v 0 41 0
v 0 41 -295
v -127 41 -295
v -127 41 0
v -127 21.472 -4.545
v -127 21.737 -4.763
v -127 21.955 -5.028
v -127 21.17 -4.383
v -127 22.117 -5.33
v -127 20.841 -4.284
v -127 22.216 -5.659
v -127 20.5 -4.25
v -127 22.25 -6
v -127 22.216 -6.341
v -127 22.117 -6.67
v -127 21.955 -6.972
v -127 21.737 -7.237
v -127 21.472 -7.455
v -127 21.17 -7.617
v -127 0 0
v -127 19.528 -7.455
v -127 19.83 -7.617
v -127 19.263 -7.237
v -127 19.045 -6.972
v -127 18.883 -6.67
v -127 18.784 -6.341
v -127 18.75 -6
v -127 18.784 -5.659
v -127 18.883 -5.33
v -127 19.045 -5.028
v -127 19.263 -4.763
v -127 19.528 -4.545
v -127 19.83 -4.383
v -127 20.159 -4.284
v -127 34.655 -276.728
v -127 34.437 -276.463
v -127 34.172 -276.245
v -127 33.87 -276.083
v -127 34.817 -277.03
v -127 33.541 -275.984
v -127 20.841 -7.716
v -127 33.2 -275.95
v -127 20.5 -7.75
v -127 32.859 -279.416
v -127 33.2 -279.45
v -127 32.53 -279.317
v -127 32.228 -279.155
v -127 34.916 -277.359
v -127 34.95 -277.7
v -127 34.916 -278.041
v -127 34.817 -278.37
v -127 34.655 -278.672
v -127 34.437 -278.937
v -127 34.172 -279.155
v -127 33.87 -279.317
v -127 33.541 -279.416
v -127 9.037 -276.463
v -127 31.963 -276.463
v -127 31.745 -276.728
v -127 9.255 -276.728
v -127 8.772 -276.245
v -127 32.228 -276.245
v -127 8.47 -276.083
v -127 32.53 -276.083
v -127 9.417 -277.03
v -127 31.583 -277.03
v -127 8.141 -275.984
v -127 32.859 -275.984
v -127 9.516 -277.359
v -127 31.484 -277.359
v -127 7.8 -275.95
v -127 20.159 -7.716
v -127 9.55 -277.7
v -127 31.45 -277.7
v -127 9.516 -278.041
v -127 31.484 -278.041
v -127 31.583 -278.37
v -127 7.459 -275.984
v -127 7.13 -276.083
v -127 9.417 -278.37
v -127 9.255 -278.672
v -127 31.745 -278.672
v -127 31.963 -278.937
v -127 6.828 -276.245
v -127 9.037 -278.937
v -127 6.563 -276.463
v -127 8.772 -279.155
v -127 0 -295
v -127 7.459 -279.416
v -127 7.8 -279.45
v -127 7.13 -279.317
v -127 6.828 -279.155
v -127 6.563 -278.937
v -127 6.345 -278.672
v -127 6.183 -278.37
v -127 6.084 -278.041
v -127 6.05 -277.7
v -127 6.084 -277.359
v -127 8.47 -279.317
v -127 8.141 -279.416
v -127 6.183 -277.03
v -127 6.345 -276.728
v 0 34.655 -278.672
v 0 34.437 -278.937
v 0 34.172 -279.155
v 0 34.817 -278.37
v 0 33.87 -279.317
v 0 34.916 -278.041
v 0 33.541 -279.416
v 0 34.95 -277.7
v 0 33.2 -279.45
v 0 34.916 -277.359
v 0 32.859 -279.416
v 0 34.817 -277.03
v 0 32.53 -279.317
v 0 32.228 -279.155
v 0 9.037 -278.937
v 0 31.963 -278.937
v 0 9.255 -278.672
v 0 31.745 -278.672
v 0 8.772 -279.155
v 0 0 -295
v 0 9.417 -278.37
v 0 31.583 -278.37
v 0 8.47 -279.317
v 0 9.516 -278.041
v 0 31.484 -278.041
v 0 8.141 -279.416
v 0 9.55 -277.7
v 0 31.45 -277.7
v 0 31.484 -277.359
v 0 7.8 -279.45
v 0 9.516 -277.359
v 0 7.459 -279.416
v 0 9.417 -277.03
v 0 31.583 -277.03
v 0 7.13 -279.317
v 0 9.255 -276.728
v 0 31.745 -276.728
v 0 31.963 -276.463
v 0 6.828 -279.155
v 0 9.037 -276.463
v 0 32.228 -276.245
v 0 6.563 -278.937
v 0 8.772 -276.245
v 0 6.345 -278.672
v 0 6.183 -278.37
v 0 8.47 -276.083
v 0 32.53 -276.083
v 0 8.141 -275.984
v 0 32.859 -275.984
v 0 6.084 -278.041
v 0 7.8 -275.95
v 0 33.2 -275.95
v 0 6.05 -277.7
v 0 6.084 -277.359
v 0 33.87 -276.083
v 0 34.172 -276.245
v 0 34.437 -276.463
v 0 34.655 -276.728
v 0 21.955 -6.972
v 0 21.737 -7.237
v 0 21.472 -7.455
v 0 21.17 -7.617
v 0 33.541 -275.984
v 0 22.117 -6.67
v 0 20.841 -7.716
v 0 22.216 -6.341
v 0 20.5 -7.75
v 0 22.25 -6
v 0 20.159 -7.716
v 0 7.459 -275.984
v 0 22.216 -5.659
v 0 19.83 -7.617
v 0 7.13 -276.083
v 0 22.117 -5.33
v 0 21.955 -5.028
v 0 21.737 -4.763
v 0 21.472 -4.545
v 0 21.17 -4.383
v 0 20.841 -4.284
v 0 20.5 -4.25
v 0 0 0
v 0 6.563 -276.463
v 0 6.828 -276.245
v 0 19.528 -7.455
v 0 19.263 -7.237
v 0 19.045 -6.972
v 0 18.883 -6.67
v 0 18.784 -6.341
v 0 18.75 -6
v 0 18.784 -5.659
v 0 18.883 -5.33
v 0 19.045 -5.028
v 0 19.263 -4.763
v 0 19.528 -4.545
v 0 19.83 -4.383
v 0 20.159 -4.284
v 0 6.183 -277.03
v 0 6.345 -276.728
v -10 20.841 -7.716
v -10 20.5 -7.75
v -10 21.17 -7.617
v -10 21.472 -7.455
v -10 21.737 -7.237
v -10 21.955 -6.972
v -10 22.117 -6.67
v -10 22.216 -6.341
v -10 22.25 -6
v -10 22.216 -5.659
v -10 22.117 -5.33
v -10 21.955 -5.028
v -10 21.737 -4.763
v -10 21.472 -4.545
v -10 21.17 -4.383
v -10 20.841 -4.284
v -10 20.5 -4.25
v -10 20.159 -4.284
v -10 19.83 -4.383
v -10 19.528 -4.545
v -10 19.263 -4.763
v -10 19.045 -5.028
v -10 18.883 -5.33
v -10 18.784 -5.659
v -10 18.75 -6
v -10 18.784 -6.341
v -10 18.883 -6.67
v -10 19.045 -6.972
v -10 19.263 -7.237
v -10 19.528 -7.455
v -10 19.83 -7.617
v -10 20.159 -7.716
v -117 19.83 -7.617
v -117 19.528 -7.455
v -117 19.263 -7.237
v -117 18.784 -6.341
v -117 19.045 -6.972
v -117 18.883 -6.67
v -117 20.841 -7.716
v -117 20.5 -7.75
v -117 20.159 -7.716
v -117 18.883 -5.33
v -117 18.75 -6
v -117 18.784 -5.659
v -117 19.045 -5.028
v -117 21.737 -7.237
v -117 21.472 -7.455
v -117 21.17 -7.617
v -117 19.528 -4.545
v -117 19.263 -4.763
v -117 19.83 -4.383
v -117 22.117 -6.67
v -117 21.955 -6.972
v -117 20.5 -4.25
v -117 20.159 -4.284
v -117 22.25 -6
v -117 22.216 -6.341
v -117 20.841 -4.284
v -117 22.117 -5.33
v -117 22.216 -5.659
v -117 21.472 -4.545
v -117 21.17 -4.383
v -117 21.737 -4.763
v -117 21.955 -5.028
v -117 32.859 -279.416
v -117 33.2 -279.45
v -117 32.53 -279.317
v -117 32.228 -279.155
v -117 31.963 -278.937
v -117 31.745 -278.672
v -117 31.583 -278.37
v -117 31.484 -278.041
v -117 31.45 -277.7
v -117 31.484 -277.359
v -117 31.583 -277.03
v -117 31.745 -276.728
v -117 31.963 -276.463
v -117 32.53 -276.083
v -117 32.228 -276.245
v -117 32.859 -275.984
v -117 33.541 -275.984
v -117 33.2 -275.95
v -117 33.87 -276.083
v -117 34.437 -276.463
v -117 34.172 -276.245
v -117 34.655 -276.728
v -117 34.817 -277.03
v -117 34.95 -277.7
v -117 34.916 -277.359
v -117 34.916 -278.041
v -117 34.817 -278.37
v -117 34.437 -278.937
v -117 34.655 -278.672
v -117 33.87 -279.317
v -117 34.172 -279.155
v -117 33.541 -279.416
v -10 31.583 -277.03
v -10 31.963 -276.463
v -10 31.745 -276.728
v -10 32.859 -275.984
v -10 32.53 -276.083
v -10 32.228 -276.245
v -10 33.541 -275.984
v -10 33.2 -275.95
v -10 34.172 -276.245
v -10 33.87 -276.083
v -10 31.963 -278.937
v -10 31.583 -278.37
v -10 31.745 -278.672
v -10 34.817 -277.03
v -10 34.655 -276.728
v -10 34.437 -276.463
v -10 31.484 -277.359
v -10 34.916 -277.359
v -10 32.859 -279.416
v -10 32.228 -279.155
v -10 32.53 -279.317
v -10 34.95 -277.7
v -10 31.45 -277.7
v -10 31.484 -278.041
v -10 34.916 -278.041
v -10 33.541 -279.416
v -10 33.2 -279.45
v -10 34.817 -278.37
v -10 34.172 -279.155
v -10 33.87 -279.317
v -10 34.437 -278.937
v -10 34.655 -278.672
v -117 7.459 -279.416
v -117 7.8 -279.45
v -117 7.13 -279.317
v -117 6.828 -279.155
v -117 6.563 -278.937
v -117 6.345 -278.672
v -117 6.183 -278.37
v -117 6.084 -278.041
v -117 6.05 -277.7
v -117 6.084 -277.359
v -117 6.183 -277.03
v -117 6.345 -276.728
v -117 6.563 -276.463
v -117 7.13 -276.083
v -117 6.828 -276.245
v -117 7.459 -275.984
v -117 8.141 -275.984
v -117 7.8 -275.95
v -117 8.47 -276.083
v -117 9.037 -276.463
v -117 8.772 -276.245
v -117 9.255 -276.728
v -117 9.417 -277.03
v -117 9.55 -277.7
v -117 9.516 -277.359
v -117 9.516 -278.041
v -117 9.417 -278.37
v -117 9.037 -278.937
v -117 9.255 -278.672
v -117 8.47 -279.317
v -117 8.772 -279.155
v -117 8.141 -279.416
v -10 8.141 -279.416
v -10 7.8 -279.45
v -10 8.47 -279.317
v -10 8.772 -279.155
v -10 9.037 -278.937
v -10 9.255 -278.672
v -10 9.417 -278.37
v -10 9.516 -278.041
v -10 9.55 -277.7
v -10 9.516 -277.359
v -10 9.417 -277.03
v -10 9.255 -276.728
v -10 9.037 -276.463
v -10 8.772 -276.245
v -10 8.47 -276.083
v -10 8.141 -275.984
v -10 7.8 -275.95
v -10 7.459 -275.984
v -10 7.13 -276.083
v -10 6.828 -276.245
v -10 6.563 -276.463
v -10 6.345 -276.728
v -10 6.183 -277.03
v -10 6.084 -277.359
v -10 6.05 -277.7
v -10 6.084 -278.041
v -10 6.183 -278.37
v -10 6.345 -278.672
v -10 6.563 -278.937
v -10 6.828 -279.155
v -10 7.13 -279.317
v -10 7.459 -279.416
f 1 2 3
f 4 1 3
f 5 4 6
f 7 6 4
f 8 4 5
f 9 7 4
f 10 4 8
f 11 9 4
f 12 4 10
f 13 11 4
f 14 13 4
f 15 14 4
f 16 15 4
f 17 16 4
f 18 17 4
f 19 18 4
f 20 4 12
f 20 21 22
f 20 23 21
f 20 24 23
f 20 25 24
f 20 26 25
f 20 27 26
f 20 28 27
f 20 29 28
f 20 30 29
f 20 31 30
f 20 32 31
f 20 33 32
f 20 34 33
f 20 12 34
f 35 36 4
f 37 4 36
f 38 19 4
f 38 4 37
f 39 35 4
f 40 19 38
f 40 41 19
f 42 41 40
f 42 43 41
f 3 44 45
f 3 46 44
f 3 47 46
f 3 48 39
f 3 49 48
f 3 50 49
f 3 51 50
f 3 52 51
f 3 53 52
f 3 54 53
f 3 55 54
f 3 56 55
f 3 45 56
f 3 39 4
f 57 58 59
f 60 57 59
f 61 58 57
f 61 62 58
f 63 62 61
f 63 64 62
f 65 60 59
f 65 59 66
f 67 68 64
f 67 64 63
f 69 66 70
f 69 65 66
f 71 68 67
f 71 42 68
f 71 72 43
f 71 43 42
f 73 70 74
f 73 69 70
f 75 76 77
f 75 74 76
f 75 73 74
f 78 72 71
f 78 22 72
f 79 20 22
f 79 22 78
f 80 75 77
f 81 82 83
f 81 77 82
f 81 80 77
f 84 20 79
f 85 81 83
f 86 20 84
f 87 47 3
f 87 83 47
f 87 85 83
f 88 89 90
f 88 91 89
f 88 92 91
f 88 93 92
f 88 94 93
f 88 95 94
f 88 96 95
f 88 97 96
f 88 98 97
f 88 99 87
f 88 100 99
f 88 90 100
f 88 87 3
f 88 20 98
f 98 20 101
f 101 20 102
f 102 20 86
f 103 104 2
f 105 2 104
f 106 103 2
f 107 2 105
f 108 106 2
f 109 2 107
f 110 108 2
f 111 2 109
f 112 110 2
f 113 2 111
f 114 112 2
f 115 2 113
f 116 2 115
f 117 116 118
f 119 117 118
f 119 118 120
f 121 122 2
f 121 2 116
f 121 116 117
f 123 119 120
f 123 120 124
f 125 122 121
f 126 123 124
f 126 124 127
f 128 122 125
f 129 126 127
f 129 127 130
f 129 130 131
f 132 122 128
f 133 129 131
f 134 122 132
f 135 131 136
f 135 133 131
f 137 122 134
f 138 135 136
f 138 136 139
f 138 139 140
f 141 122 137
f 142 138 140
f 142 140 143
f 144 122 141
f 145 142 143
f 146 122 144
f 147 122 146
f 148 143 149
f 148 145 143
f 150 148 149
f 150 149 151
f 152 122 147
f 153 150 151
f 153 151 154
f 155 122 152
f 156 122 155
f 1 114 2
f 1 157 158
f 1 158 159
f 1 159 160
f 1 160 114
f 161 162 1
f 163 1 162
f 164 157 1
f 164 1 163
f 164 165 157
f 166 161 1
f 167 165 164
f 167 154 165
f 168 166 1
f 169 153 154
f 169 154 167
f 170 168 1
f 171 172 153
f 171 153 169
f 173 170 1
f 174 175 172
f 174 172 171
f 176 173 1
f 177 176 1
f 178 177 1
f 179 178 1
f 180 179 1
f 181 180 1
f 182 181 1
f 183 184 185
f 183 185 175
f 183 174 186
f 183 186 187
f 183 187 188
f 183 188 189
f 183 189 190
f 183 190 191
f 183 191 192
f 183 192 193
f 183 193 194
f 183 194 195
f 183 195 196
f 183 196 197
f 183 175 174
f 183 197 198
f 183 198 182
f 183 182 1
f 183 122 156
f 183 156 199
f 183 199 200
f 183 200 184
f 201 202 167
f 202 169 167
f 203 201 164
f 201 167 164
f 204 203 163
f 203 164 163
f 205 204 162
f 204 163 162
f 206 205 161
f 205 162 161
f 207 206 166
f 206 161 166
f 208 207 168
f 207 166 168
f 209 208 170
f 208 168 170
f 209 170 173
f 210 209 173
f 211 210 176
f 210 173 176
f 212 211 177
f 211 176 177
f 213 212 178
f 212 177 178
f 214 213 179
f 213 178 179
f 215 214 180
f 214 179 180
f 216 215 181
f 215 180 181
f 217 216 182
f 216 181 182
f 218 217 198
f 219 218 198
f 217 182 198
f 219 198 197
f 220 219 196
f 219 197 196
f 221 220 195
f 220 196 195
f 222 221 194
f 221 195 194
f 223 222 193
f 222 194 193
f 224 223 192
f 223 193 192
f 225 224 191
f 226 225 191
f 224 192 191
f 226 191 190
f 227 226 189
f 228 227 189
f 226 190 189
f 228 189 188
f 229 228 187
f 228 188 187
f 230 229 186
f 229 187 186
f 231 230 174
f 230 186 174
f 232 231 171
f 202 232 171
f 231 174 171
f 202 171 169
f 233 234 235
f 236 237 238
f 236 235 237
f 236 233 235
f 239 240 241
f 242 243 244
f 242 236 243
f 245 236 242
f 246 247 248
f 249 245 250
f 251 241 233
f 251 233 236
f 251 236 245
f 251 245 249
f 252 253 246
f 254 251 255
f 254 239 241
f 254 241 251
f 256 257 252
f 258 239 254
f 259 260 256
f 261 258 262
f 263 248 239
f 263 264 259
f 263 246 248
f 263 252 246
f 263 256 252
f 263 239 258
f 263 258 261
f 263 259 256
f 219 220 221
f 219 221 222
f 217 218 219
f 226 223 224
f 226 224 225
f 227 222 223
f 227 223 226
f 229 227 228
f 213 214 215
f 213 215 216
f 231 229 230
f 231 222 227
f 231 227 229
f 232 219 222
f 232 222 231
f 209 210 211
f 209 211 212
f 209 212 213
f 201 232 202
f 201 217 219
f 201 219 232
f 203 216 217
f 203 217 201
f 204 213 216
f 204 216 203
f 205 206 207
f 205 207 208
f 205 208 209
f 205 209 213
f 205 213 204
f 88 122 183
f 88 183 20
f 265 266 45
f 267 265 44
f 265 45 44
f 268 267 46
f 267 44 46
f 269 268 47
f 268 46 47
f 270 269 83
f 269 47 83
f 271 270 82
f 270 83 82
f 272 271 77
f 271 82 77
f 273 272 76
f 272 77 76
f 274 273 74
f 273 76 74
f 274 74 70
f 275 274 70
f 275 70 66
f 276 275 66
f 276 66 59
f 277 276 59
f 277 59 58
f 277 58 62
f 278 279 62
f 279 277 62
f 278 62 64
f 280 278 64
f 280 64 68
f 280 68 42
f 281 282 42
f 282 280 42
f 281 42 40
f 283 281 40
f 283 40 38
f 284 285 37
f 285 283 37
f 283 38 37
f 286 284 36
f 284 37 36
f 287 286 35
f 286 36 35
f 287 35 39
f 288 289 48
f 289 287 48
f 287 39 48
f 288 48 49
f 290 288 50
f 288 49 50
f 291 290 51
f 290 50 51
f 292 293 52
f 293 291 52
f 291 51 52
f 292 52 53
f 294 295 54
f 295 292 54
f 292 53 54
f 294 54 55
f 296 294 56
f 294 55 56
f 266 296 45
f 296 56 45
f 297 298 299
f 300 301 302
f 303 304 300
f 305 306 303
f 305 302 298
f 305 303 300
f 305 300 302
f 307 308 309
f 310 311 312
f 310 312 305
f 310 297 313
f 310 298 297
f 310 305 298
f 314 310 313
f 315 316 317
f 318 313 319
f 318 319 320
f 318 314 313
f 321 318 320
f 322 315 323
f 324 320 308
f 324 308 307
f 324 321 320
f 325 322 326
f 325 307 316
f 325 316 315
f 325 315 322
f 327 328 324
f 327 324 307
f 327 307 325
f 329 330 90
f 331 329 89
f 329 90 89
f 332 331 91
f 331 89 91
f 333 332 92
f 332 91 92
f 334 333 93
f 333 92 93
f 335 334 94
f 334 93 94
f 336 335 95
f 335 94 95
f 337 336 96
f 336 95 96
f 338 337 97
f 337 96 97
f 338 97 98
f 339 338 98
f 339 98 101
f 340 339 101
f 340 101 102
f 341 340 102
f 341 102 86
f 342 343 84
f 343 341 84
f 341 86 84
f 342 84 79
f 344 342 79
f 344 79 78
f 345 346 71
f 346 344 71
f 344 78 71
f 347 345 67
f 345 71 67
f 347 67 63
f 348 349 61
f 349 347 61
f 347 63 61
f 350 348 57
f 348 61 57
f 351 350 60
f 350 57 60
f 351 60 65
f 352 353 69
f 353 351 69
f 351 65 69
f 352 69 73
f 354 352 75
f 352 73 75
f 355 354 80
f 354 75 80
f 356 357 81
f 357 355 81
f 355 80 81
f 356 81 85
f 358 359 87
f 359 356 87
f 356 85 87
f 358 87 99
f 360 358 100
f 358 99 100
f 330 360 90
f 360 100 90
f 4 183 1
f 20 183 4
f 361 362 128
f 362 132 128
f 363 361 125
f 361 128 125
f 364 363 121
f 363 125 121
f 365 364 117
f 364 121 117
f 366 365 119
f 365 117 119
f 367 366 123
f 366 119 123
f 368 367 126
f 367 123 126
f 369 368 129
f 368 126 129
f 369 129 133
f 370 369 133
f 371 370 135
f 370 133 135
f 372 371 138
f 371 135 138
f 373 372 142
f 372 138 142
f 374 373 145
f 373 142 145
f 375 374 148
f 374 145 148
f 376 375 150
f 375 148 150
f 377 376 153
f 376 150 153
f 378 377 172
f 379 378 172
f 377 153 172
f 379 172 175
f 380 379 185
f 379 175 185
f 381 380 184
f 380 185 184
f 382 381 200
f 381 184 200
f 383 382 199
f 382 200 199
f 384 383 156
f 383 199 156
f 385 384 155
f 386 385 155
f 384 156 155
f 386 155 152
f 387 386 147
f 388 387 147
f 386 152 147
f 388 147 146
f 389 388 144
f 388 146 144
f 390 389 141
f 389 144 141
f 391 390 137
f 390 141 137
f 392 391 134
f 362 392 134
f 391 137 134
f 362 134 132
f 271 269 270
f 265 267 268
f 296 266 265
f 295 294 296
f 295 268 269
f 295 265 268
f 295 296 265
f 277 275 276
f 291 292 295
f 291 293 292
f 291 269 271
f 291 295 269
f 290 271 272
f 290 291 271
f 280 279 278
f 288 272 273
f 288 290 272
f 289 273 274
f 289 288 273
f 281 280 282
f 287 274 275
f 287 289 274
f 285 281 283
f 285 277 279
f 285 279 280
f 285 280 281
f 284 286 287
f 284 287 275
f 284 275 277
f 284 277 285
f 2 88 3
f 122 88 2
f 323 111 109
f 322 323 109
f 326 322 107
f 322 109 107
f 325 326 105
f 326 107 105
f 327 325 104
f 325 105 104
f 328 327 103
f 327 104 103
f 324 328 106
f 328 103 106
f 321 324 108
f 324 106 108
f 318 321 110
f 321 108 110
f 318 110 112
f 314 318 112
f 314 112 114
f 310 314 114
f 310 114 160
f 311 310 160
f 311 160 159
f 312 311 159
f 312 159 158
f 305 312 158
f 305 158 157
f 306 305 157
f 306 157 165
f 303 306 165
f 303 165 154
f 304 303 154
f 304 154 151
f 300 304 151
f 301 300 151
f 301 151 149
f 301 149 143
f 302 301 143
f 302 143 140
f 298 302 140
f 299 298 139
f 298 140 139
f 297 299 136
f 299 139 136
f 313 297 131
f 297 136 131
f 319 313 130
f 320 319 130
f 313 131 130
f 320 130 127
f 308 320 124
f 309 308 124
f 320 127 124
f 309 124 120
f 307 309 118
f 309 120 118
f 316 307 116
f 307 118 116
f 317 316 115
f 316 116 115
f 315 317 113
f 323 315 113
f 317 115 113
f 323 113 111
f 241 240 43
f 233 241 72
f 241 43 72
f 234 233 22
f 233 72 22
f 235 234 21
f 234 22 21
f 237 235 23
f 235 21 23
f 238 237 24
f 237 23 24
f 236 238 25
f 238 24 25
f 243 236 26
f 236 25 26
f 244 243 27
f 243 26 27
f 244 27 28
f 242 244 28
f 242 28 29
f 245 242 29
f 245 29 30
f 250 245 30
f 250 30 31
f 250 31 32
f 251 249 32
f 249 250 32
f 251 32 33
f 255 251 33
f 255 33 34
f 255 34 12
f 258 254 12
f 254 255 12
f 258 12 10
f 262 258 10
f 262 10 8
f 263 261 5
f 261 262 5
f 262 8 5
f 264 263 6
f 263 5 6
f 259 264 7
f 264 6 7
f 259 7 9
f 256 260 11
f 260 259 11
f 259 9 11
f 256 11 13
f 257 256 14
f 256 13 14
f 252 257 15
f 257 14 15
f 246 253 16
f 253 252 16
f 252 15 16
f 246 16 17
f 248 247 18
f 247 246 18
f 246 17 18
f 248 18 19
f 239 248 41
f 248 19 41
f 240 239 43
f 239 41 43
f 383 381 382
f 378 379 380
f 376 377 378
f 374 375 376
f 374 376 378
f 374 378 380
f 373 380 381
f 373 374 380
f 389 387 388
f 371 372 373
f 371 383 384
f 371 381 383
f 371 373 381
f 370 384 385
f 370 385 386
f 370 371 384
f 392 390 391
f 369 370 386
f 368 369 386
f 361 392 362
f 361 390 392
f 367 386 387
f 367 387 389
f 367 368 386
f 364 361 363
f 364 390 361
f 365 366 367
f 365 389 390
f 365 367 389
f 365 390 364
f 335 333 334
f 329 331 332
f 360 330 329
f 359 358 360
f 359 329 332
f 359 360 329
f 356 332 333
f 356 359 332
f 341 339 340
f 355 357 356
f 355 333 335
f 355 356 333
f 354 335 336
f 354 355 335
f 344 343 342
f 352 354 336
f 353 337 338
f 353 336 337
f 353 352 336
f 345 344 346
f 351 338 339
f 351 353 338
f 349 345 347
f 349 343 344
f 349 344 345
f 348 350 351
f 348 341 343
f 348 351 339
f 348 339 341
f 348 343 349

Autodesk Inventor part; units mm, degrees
ref_plane "XZ Plane" through (0, 0, 0) normal (0, 1, 0) x (-1, 0, 0)
ref_plane "XY Plane" through (0, 0, 0) normal (0, 0, 1) x (1, 0, 0)
sketch "Sketch1" plane through (0, 0, 0) normal (0, 1, 0) x (-1, 0, 0)
  line L0 (0, 0) -> (127, 0)
  line L1 (127, 0) -> (127, -295)
  line L2 (127, -295) -> (0, -295)
  line L3 (0, -295) -> (0, 0)
  dimension "d0" = 127
  dimension "d1" = 295
extrude "Extrusion1" add sketch "Sketch1" along normal blind 41
sketch "Sketch2" plane through (0, 0, 0) normal (1, 0, 0) x (0, 0, -1)
  line L0 (0, 0) -> (0, 20.5)
  line L1 (0, 0) -> (0, 41) projected
  line L2 (0, 20.5) -> (6, 20.5)
  circle A0 centre (6, 20.5) radius 1.75
  line L3 (295, 0) -> (0, 0) projected
  line L4 (295, 0) -> (295, 7.8)
  line L5 (295, 0) -> (295, 41) projected
  line L6 (0, 0) -> (277.7, 0)
  line L7 (277.7, 0) -> (277.7, 7.8)
  line L8 (277.7, 7.8) -> (277.7, 33.2)
  circle A1 centre (277.7, 7.8) radius 1.75
  circle A2 centre (277.7, 33.2) radius 1.75
  dimension "d4" = 20.5
  dimension "d5" = 6
  dimension "d6" = 3.5
  dimension "d7" = 7.8
  dimension "d8" = 277.7
  dimension "d9" = 7.8
  dimension "d10" = 25.4
  dimension "d11" = 3.5
  dimension "d12" = 3.5
extrude "Extrusion2" cut sketch "Sketch2" against normal blind 10
ref_plane "Work Plane1" through (-63.5, 0, 0) normal (1, 0, 0) x (0, 1, 0)
mirror "Mirror1" about plane through (-63.5, 0, 0) normal (1, 0, 0) of "Extrusion2"
properties part number "RSP-1000PS"
